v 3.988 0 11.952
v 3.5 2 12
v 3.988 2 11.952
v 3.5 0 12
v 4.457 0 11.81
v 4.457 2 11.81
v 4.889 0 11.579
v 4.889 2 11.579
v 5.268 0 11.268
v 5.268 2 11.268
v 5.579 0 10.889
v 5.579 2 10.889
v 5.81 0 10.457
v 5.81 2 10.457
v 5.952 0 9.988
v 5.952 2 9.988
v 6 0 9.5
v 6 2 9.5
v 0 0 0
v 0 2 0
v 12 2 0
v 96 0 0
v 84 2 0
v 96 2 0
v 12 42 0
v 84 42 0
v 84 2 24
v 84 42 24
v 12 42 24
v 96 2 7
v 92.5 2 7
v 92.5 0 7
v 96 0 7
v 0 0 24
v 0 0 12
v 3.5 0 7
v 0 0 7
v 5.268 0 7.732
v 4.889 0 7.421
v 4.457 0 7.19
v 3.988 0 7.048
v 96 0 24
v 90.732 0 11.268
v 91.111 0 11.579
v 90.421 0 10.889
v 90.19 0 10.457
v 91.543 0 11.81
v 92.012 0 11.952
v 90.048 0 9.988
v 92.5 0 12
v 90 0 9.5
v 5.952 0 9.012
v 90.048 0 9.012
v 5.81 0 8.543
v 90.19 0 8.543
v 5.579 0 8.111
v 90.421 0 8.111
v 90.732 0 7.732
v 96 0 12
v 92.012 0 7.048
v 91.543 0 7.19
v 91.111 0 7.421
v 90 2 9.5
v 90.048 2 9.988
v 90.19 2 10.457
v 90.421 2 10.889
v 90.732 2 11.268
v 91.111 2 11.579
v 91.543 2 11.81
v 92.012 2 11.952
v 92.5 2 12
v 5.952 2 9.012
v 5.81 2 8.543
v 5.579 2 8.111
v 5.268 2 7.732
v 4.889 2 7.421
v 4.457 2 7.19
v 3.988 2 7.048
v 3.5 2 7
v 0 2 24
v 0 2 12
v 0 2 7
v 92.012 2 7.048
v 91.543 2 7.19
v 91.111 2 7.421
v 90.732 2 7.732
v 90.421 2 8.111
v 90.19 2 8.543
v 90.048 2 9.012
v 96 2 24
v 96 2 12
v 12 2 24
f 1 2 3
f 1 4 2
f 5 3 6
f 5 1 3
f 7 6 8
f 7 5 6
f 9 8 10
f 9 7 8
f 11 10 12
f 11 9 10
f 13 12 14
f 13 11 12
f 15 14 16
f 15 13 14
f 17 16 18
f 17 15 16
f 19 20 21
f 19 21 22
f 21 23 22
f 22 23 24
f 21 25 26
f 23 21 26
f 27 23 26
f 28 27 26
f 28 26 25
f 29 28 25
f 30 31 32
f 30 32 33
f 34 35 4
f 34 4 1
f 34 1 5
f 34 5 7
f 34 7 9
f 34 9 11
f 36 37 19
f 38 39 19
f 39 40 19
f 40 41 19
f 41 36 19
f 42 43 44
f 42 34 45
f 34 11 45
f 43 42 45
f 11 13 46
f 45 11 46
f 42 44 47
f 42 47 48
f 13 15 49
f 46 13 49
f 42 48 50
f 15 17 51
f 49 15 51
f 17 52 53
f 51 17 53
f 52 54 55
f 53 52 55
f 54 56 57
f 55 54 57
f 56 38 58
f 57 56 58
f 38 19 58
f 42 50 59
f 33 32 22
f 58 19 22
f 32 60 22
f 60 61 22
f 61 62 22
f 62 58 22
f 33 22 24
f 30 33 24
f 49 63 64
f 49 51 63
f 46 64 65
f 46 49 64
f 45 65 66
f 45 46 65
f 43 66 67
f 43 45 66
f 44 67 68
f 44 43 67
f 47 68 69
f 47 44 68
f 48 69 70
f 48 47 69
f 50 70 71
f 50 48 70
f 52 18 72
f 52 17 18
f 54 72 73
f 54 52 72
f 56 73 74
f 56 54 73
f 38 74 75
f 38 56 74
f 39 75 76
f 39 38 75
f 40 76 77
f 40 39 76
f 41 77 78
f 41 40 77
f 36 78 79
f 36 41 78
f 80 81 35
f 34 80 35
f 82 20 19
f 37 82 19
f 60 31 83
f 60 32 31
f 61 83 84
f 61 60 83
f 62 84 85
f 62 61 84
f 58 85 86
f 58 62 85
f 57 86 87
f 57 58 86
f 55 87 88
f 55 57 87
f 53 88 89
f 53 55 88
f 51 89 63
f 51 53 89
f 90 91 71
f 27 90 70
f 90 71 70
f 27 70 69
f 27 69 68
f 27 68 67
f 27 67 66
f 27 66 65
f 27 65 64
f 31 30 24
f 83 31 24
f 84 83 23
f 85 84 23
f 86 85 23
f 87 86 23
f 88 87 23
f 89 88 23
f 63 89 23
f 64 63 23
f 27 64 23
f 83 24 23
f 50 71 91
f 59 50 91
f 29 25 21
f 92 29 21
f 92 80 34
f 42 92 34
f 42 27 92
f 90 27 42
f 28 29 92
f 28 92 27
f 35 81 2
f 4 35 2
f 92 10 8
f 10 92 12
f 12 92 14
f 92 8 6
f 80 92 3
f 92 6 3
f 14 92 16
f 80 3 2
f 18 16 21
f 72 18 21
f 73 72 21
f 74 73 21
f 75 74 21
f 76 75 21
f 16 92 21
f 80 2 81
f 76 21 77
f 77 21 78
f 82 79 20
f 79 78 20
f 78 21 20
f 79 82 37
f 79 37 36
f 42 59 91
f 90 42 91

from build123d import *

# Parameters (mm, degrees)
BODY_DEPTH               = 24
SKETCH2_W                = 6
SKETCH2_H                = 5
FIXATION_CUTOUT_DEPTH    = 107.733312513
FIXATION_CUTOUT_ROUNDS_R = 2.5


with BuildPart() as part:
    # Sketch1 → body (new body)
    with BuildSketch(Plane.XY):
        Polygon((0, 0), (96, 0), (96, 2), (84, 2), (84, 42), (12, 42), (12, 2), (0, 2), align=None)
    extrude(amount=BODY_DEPTH)

    # Sketch2 → fixation_cutout (cut, through all)
    with BuildSketch(Plane(origin=(0, 2, 0), x_dir=(1, 0, 0), z_dir=(0, 1, 0))):
        with Locations((3, -9.5)):
            Rectangle(SKETCH2_W, SKETCH2_H)
        with Locations((93, -9.5)):
            Rectangle(SKETCH2_W, SKETCH2_H)
    extrude(amount=-FIXATION_CUTOUT_DEPTH, mode=Mode.SUBTRACT)

    # fixation_cutout_rounds
    fixation_cutout_rounds_edges = [part.edges().sort_by_distance(p)[0] for p in [
        (90, 1, 12),
        (90, 1, 7),
        (6, 1, 12),
        (6, 1, 7),
    ]]
    fillet(fixation_cutout_rounds_edges, radius=FIXATION_CUTOUT_ROUNDS_R - 0.0001)  # a hair under: the kernel refuses the full size


solid = part.part
